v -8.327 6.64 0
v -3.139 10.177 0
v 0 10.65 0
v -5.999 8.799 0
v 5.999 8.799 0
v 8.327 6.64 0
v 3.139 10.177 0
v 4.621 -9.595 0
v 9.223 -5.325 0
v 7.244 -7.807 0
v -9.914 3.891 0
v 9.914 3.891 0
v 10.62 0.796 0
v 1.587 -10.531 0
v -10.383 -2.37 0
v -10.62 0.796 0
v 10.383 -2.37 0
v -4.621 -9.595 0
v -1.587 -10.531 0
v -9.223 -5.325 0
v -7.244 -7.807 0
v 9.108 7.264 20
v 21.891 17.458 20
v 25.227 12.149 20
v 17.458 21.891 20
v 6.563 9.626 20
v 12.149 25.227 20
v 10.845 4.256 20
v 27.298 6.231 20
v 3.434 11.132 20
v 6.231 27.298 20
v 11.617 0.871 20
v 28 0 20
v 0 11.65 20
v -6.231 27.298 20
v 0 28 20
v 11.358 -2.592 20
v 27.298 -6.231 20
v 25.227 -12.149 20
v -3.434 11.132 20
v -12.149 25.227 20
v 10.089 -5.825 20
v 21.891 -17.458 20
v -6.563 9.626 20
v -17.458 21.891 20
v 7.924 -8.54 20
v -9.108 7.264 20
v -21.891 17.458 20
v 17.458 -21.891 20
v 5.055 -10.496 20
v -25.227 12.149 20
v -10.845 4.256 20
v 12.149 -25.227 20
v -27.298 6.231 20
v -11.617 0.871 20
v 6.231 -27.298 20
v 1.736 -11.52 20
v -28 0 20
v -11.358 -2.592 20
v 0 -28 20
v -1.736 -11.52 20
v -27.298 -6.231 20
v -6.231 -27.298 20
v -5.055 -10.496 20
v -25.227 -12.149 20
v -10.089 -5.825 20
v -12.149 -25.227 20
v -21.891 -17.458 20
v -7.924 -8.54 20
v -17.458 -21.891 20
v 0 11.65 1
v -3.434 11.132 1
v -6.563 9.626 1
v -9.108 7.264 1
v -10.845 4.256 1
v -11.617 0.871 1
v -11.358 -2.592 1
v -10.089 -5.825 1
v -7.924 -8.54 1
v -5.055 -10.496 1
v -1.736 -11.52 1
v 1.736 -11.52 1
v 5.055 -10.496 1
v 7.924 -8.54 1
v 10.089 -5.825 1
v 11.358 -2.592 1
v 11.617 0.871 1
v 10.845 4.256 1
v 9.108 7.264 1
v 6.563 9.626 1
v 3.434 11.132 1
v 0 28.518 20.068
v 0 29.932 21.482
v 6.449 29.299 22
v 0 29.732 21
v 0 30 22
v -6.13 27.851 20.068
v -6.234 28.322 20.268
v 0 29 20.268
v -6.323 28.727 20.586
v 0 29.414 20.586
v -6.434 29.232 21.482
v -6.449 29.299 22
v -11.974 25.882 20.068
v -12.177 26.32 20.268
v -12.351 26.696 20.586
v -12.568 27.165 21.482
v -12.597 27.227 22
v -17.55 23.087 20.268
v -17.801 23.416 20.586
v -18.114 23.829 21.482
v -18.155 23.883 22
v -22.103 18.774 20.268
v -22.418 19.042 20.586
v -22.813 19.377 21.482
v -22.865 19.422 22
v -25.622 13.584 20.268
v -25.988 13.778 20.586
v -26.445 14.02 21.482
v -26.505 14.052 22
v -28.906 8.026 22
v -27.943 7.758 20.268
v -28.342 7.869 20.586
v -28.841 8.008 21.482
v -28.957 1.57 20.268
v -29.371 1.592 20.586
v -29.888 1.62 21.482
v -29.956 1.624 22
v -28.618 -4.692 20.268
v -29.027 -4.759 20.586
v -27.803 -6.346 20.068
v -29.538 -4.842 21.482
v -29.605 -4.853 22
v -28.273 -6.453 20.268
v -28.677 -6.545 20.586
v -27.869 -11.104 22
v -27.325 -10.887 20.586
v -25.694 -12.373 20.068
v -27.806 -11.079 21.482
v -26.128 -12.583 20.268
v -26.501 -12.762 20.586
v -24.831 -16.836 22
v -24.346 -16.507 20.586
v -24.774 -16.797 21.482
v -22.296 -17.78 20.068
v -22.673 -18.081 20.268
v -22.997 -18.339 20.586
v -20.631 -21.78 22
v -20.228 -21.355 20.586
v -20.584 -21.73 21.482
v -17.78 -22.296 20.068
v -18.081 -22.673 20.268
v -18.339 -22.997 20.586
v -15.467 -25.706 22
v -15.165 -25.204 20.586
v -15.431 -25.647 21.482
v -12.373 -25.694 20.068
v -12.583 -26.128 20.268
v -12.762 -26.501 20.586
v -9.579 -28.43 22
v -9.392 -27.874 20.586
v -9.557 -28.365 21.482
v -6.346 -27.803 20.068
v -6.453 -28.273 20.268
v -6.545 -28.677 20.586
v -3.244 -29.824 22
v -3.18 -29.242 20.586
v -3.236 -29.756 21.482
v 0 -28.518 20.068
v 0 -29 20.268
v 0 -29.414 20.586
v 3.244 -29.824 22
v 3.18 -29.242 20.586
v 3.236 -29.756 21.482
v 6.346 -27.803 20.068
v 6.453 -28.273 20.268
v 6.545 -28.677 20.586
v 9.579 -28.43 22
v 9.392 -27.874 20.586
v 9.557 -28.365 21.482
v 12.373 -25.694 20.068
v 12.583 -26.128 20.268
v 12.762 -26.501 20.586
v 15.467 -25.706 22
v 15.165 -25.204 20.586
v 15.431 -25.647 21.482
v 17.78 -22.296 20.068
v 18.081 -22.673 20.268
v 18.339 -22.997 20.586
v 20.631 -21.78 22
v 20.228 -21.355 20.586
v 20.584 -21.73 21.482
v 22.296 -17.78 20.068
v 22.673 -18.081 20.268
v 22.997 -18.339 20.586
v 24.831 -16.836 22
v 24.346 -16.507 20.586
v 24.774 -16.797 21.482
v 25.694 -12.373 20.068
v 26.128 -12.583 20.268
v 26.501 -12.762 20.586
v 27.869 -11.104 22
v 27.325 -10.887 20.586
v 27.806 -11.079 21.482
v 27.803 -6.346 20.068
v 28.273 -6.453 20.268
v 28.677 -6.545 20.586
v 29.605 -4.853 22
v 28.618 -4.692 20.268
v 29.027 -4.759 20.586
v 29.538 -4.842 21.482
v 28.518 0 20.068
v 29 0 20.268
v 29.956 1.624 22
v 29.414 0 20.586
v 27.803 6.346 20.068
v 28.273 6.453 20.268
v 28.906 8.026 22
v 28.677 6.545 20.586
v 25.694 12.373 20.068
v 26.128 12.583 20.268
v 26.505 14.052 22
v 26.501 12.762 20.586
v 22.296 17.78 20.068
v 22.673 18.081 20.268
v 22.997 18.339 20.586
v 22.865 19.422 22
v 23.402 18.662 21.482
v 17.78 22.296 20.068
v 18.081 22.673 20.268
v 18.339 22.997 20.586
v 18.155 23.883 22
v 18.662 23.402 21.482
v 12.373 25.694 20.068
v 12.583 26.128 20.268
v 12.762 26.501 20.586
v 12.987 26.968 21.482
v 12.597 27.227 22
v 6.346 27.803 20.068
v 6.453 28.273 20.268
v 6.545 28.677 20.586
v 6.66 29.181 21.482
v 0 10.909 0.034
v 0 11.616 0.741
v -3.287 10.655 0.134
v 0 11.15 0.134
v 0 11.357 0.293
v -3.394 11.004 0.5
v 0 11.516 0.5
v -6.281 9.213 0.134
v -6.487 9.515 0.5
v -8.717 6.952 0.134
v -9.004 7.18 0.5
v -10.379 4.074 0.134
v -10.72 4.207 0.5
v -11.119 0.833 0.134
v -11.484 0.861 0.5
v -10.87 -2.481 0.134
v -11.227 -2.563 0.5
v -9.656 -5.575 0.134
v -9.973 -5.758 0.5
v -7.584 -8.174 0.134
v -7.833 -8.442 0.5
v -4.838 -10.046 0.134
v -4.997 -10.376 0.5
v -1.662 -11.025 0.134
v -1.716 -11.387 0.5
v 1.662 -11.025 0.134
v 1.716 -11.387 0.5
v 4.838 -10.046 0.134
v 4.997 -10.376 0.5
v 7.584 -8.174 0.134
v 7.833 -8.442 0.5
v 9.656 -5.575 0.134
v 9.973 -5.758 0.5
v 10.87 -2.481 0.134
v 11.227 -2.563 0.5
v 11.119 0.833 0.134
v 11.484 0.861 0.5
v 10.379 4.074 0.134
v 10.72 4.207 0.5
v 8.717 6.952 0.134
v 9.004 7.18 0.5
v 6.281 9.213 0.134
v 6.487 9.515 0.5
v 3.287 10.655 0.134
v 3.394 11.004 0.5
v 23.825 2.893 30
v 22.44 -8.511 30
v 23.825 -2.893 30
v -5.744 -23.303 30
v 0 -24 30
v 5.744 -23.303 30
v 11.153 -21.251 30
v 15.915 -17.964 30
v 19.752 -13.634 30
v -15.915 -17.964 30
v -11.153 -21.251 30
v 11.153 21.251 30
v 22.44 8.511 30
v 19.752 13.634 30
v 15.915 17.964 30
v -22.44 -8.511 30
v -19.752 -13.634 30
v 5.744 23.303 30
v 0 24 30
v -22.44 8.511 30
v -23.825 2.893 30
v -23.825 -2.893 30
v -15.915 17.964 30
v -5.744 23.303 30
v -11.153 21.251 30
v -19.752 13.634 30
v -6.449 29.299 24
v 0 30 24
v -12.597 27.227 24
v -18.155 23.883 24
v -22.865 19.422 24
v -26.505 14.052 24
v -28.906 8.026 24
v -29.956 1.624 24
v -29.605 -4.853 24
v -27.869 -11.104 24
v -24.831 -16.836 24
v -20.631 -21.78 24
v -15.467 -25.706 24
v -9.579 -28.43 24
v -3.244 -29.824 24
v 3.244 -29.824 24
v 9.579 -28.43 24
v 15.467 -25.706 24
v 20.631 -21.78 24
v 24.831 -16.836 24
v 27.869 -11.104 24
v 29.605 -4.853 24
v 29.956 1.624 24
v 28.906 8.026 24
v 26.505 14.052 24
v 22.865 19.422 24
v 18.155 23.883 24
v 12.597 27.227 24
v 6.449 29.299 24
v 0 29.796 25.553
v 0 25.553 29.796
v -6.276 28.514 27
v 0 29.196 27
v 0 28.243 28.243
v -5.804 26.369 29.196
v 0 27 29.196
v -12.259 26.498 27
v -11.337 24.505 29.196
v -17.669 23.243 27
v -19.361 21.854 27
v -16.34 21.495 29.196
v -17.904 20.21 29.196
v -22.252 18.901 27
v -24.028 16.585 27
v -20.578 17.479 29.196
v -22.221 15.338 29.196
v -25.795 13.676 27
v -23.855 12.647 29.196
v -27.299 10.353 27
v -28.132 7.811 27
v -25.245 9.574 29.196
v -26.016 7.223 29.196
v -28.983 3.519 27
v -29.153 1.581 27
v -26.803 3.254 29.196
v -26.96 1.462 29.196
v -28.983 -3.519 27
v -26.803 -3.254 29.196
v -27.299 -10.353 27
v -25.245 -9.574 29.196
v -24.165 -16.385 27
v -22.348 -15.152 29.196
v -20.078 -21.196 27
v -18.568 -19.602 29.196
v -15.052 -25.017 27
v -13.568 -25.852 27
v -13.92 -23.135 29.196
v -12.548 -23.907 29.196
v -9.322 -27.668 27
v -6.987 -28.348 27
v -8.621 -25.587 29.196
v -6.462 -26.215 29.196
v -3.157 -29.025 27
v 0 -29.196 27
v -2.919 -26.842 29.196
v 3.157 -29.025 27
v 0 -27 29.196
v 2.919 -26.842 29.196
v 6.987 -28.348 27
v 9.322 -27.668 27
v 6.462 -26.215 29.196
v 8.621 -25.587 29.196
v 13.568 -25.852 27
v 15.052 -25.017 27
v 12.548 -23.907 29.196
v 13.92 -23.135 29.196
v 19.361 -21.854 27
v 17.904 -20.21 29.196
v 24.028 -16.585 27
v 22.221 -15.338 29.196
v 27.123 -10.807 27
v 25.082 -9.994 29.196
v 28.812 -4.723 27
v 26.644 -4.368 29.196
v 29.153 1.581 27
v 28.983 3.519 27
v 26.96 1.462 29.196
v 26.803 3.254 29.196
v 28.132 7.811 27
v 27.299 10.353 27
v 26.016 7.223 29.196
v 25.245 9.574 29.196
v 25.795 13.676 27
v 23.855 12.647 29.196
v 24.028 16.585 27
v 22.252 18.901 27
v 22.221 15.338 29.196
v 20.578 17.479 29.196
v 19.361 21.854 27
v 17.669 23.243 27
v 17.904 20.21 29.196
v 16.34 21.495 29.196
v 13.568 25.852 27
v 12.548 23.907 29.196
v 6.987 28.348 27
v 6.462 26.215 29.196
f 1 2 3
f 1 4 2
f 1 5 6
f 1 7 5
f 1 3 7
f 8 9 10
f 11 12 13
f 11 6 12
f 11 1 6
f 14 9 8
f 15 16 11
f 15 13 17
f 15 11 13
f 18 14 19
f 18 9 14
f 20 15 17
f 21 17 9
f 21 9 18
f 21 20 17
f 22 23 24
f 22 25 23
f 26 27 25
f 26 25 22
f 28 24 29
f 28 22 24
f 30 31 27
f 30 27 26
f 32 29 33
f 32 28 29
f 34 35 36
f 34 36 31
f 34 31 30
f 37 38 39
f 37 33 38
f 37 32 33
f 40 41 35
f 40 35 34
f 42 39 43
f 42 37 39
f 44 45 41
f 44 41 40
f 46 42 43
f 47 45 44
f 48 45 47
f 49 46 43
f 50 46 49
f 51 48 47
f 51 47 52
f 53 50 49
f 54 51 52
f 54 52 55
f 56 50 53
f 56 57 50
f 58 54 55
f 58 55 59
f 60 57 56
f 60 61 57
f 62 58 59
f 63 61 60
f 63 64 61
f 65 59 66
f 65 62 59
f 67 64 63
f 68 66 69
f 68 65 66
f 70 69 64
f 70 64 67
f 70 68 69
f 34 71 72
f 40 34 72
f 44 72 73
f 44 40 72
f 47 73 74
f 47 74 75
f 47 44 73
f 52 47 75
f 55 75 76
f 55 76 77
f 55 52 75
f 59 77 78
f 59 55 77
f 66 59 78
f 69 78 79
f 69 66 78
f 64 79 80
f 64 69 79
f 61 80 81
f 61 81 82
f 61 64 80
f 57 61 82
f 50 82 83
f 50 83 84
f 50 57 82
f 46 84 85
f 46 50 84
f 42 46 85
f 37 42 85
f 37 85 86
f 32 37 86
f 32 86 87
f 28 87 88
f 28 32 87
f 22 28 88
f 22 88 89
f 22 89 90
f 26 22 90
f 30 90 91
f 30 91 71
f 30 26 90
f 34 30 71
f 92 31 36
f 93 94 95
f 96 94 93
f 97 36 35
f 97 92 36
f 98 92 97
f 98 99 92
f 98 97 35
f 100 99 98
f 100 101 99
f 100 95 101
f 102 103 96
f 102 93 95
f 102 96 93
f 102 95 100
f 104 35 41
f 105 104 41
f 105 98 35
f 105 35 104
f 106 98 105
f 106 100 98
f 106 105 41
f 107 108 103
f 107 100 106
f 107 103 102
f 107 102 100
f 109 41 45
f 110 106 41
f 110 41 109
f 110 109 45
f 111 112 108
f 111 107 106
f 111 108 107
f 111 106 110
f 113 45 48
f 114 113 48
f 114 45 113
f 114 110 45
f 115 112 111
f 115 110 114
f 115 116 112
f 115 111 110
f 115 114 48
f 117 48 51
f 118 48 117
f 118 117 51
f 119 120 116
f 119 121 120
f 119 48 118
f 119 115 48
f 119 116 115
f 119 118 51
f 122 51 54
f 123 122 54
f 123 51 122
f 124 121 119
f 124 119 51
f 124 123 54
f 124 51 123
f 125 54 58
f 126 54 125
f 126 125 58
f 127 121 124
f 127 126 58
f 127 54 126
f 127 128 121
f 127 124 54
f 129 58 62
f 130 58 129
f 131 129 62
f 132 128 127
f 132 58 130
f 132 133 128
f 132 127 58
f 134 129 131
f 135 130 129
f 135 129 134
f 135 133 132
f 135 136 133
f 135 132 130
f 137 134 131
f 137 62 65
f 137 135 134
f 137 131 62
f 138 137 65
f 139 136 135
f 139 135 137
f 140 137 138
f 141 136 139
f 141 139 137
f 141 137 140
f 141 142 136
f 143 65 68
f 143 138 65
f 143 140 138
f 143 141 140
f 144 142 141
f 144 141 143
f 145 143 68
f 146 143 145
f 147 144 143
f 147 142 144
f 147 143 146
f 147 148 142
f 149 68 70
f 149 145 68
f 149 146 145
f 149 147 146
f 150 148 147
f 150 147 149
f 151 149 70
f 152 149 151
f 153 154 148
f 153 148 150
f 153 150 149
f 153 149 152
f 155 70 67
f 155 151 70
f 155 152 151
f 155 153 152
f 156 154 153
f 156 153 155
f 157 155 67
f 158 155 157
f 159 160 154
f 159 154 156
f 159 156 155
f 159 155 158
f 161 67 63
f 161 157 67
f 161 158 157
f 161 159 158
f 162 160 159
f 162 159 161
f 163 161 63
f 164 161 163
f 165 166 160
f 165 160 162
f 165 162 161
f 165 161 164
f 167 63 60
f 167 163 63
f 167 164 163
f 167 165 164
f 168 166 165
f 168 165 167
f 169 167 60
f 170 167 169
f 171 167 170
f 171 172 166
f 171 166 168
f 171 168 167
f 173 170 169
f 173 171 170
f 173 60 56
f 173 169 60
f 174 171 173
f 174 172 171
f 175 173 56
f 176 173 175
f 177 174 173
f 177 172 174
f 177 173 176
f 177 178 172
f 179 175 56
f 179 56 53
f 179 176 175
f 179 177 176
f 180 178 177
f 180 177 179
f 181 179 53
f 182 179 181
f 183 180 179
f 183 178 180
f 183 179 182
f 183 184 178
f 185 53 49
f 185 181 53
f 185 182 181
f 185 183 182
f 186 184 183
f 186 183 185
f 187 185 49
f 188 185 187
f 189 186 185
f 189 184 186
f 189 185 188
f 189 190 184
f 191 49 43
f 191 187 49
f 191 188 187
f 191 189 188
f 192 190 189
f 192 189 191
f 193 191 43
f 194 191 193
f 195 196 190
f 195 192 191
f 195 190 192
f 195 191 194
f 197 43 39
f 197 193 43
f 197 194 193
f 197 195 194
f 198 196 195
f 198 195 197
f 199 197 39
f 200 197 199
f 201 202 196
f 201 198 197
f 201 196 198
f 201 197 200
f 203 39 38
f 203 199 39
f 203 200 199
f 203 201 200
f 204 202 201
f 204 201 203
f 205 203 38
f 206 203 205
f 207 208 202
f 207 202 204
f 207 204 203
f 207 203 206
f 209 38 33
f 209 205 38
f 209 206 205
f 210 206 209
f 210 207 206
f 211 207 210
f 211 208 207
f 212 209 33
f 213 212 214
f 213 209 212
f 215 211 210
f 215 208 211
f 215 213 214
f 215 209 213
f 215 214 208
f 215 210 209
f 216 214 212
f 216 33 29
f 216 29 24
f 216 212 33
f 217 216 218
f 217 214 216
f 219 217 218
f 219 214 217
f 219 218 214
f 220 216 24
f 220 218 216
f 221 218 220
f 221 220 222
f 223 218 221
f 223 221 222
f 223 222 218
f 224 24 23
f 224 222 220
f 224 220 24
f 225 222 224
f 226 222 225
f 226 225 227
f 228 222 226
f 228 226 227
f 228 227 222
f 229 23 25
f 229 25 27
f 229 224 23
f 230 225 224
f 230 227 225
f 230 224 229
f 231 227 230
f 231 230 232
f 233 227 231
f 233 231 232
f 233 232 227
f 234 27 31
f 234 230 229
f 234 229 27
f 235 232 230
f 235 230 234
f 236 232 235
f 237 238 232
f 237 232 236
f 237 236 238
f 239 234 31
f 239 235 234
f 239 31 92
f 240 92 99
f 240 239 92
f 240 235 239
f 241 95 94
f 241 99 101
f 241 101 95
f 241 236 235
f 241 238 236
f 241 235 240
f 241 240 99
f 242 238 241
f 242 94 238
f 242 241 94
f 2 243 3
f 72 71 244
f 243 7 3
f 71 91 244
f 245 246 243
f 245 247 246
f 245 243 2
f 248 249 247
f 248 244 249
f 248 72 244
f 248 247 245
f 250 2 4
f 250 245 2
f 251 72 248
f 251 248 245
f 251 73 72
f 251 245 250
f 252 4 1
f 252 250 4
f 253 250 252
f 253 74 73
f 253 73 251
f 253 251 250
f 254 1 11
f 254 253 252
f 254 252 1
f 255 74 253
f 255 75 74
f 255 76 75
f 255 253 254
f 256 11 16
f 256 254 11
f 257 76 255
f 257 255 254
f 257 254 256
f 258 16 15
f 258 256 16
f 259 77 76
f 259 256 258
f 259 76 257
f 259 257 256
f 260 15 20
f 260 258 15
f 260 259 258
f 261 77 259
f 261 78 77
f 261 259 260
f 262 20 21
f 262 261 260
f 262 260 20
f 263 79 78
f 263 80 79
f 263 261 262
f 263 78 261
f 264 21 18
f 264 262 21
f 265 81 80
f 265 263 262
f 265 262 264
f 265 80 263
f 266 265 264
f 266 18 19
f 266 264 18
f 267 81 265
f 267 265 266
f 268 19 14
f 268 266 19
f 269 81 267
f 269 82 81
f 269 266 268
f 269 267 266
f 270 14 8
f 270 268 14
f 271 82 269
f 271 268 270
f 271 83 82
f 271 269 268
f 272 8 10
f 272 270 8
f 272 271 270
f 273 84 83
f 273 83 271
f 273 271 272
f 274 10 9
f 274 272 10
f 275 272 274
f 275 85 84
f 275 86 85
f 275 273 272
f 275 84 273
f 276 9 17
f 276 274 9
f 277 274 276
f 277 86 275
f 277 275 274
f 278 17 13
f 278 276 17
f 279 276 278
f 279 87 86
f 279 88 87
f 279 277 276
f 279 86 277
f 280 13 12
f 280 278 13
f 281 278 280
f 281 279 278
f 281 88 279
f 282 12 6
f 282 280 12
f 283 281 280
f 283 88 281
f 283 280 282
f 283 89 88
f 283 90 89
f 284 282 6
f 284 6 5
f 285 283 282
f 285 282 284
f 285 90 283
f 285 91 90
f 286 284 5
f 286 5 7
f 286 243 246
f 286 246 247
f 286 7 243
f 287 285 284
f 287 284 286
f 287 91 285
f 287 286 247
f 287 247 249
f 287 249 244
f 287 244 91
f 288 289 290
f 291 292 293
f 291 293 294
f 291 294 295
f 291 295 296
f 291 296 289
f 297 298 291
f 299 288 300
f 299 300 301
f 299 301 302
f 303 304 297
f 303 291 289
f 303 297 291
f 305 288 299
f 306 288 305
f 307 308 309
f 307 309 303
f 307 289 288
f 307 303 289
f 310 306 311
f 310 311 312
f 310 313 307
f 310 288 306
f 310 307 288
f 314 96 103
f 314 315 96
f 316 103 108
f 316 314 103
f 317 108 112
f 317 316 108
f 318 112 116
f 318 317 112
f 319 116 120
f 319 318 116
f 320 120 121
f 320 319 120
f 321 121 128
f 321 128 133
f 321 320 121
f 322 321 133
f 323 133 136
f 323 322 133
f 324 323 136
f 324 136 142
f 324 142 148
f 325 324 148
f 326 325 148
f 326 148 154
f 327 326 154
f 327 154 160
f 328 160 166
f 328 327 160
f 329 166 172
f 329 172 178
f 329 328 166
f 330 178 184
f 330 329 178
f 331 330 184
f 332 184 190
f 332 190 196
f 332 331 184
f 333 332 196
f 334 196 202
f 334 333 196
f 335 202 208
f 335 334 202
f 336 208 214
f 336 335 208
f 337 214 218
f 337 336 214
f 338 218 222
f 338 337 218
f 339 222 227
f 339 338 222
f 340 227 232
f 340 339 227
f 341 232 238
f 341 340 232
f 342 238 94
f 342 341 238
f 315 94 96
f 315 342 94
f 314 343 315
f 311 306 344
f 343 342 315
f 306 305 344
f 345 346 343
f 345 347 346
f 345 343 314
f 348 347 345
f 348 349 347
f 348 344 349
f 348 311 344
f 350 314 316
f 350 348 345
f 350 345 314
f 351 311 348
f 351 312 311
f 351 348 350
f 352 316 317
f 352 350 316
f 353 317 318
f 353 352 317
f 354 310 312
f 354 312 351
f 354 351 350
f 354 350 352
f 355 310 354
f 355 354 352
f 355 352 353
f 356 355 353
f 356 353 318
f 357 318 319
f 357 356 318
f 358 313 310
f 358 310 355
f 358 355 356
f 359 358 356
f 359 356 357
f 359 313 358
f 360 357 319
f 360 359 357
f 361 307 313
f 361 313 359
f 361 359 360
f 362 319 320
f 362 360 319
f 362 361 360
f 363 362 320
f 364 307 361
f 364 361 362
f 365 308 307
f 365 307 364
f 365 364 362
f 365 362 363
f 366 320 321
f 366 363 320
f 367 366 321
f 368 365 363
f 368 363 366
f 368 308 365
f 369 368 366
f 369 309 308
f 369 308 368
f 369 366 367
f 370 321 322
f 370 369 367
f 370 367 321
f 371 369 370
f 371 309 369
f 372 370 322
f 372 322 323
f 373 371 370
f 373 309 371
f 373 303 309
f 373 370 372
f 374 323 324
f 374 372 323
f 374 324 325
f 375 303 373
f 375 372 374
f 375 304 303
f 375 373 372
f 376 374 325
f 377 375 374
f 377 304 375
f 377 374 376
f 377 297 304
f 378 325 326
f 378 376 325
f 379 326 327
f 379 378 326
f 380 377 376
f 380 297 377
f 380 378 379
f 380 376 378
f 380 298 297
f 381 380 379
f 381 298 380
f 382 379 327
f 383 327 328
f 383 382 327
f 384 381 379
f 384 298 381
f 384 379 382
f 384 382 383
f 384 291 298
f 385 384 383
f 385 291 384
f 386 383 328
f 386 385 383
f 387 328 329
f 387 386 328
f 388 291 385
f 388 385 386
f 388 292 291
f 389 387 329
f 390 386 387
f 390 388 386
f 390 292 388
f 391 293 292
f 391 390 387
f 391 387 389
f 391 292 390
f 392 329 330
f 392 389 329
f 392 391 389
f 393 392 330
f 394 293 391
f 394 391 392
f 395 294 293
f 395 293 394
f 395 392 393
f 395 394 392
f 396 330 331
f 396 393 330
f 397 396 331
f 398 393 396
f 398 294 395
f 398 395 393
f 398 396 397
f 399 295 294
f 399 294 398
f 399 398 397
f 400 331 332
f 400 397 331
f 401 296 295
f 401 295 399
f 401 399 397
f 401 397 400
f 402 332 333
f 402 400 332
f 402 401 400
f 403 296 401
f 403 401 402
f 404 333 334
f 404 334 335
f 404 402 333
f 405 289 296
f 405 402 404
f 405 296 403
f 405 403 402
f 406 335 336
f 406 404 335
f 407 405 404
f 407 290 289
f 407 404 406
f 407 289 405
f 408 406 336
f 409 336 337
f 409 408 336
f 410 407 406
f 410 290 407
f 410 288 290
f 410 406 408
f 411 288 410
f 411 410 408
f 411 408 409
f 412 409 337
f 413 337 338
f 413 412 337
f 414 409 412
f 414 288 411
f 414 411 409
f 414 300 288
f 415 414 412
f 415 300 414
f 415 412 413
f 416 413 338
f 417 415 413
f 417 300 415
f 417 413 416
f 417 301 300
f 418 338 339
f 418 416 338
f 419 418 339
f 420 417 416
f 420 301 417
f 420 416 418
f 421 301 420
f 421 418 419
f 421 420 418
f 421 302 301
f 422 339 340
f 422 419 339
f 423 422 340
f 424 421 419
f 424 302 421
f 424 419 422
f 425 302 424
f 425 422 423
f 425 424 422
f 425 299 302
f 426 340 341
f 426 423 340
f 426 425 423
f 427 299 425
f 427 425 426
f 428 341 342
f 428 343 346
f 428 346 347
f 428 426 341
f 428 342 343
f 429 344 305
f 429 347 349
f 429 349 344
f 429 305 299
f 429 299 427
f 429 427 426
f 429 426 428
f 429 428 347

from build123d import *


with BuildPart() as f1:
    # F0 (on Right) → F1 (revolve)
    with BuildSketch(Plane.YZ):
        with BuildLine():
            Line((0, 30), (0, 0))
            Line((0, 0), (10.65, 0))
            ThreePointArc((10.65, 0), (11.357107, 0.292893), (11.65, 1))
            Line((11.65, 1), (11.65, 20))
            Line((11.65, 20), (28, 20))
            ThreePointArc((28, 20), (29.414214, 20.585786), (30, 22))
            Line((30, 22), (30, 24))
            ThreePointArc((30, 24), (28.242641, 28.242641), (24, 30))
            Line((24, 30), (0, 30))
        make_face()
    revolve(axis=Axis((0, 0, 15), (0, 0, 1)))


solid = f1.part
